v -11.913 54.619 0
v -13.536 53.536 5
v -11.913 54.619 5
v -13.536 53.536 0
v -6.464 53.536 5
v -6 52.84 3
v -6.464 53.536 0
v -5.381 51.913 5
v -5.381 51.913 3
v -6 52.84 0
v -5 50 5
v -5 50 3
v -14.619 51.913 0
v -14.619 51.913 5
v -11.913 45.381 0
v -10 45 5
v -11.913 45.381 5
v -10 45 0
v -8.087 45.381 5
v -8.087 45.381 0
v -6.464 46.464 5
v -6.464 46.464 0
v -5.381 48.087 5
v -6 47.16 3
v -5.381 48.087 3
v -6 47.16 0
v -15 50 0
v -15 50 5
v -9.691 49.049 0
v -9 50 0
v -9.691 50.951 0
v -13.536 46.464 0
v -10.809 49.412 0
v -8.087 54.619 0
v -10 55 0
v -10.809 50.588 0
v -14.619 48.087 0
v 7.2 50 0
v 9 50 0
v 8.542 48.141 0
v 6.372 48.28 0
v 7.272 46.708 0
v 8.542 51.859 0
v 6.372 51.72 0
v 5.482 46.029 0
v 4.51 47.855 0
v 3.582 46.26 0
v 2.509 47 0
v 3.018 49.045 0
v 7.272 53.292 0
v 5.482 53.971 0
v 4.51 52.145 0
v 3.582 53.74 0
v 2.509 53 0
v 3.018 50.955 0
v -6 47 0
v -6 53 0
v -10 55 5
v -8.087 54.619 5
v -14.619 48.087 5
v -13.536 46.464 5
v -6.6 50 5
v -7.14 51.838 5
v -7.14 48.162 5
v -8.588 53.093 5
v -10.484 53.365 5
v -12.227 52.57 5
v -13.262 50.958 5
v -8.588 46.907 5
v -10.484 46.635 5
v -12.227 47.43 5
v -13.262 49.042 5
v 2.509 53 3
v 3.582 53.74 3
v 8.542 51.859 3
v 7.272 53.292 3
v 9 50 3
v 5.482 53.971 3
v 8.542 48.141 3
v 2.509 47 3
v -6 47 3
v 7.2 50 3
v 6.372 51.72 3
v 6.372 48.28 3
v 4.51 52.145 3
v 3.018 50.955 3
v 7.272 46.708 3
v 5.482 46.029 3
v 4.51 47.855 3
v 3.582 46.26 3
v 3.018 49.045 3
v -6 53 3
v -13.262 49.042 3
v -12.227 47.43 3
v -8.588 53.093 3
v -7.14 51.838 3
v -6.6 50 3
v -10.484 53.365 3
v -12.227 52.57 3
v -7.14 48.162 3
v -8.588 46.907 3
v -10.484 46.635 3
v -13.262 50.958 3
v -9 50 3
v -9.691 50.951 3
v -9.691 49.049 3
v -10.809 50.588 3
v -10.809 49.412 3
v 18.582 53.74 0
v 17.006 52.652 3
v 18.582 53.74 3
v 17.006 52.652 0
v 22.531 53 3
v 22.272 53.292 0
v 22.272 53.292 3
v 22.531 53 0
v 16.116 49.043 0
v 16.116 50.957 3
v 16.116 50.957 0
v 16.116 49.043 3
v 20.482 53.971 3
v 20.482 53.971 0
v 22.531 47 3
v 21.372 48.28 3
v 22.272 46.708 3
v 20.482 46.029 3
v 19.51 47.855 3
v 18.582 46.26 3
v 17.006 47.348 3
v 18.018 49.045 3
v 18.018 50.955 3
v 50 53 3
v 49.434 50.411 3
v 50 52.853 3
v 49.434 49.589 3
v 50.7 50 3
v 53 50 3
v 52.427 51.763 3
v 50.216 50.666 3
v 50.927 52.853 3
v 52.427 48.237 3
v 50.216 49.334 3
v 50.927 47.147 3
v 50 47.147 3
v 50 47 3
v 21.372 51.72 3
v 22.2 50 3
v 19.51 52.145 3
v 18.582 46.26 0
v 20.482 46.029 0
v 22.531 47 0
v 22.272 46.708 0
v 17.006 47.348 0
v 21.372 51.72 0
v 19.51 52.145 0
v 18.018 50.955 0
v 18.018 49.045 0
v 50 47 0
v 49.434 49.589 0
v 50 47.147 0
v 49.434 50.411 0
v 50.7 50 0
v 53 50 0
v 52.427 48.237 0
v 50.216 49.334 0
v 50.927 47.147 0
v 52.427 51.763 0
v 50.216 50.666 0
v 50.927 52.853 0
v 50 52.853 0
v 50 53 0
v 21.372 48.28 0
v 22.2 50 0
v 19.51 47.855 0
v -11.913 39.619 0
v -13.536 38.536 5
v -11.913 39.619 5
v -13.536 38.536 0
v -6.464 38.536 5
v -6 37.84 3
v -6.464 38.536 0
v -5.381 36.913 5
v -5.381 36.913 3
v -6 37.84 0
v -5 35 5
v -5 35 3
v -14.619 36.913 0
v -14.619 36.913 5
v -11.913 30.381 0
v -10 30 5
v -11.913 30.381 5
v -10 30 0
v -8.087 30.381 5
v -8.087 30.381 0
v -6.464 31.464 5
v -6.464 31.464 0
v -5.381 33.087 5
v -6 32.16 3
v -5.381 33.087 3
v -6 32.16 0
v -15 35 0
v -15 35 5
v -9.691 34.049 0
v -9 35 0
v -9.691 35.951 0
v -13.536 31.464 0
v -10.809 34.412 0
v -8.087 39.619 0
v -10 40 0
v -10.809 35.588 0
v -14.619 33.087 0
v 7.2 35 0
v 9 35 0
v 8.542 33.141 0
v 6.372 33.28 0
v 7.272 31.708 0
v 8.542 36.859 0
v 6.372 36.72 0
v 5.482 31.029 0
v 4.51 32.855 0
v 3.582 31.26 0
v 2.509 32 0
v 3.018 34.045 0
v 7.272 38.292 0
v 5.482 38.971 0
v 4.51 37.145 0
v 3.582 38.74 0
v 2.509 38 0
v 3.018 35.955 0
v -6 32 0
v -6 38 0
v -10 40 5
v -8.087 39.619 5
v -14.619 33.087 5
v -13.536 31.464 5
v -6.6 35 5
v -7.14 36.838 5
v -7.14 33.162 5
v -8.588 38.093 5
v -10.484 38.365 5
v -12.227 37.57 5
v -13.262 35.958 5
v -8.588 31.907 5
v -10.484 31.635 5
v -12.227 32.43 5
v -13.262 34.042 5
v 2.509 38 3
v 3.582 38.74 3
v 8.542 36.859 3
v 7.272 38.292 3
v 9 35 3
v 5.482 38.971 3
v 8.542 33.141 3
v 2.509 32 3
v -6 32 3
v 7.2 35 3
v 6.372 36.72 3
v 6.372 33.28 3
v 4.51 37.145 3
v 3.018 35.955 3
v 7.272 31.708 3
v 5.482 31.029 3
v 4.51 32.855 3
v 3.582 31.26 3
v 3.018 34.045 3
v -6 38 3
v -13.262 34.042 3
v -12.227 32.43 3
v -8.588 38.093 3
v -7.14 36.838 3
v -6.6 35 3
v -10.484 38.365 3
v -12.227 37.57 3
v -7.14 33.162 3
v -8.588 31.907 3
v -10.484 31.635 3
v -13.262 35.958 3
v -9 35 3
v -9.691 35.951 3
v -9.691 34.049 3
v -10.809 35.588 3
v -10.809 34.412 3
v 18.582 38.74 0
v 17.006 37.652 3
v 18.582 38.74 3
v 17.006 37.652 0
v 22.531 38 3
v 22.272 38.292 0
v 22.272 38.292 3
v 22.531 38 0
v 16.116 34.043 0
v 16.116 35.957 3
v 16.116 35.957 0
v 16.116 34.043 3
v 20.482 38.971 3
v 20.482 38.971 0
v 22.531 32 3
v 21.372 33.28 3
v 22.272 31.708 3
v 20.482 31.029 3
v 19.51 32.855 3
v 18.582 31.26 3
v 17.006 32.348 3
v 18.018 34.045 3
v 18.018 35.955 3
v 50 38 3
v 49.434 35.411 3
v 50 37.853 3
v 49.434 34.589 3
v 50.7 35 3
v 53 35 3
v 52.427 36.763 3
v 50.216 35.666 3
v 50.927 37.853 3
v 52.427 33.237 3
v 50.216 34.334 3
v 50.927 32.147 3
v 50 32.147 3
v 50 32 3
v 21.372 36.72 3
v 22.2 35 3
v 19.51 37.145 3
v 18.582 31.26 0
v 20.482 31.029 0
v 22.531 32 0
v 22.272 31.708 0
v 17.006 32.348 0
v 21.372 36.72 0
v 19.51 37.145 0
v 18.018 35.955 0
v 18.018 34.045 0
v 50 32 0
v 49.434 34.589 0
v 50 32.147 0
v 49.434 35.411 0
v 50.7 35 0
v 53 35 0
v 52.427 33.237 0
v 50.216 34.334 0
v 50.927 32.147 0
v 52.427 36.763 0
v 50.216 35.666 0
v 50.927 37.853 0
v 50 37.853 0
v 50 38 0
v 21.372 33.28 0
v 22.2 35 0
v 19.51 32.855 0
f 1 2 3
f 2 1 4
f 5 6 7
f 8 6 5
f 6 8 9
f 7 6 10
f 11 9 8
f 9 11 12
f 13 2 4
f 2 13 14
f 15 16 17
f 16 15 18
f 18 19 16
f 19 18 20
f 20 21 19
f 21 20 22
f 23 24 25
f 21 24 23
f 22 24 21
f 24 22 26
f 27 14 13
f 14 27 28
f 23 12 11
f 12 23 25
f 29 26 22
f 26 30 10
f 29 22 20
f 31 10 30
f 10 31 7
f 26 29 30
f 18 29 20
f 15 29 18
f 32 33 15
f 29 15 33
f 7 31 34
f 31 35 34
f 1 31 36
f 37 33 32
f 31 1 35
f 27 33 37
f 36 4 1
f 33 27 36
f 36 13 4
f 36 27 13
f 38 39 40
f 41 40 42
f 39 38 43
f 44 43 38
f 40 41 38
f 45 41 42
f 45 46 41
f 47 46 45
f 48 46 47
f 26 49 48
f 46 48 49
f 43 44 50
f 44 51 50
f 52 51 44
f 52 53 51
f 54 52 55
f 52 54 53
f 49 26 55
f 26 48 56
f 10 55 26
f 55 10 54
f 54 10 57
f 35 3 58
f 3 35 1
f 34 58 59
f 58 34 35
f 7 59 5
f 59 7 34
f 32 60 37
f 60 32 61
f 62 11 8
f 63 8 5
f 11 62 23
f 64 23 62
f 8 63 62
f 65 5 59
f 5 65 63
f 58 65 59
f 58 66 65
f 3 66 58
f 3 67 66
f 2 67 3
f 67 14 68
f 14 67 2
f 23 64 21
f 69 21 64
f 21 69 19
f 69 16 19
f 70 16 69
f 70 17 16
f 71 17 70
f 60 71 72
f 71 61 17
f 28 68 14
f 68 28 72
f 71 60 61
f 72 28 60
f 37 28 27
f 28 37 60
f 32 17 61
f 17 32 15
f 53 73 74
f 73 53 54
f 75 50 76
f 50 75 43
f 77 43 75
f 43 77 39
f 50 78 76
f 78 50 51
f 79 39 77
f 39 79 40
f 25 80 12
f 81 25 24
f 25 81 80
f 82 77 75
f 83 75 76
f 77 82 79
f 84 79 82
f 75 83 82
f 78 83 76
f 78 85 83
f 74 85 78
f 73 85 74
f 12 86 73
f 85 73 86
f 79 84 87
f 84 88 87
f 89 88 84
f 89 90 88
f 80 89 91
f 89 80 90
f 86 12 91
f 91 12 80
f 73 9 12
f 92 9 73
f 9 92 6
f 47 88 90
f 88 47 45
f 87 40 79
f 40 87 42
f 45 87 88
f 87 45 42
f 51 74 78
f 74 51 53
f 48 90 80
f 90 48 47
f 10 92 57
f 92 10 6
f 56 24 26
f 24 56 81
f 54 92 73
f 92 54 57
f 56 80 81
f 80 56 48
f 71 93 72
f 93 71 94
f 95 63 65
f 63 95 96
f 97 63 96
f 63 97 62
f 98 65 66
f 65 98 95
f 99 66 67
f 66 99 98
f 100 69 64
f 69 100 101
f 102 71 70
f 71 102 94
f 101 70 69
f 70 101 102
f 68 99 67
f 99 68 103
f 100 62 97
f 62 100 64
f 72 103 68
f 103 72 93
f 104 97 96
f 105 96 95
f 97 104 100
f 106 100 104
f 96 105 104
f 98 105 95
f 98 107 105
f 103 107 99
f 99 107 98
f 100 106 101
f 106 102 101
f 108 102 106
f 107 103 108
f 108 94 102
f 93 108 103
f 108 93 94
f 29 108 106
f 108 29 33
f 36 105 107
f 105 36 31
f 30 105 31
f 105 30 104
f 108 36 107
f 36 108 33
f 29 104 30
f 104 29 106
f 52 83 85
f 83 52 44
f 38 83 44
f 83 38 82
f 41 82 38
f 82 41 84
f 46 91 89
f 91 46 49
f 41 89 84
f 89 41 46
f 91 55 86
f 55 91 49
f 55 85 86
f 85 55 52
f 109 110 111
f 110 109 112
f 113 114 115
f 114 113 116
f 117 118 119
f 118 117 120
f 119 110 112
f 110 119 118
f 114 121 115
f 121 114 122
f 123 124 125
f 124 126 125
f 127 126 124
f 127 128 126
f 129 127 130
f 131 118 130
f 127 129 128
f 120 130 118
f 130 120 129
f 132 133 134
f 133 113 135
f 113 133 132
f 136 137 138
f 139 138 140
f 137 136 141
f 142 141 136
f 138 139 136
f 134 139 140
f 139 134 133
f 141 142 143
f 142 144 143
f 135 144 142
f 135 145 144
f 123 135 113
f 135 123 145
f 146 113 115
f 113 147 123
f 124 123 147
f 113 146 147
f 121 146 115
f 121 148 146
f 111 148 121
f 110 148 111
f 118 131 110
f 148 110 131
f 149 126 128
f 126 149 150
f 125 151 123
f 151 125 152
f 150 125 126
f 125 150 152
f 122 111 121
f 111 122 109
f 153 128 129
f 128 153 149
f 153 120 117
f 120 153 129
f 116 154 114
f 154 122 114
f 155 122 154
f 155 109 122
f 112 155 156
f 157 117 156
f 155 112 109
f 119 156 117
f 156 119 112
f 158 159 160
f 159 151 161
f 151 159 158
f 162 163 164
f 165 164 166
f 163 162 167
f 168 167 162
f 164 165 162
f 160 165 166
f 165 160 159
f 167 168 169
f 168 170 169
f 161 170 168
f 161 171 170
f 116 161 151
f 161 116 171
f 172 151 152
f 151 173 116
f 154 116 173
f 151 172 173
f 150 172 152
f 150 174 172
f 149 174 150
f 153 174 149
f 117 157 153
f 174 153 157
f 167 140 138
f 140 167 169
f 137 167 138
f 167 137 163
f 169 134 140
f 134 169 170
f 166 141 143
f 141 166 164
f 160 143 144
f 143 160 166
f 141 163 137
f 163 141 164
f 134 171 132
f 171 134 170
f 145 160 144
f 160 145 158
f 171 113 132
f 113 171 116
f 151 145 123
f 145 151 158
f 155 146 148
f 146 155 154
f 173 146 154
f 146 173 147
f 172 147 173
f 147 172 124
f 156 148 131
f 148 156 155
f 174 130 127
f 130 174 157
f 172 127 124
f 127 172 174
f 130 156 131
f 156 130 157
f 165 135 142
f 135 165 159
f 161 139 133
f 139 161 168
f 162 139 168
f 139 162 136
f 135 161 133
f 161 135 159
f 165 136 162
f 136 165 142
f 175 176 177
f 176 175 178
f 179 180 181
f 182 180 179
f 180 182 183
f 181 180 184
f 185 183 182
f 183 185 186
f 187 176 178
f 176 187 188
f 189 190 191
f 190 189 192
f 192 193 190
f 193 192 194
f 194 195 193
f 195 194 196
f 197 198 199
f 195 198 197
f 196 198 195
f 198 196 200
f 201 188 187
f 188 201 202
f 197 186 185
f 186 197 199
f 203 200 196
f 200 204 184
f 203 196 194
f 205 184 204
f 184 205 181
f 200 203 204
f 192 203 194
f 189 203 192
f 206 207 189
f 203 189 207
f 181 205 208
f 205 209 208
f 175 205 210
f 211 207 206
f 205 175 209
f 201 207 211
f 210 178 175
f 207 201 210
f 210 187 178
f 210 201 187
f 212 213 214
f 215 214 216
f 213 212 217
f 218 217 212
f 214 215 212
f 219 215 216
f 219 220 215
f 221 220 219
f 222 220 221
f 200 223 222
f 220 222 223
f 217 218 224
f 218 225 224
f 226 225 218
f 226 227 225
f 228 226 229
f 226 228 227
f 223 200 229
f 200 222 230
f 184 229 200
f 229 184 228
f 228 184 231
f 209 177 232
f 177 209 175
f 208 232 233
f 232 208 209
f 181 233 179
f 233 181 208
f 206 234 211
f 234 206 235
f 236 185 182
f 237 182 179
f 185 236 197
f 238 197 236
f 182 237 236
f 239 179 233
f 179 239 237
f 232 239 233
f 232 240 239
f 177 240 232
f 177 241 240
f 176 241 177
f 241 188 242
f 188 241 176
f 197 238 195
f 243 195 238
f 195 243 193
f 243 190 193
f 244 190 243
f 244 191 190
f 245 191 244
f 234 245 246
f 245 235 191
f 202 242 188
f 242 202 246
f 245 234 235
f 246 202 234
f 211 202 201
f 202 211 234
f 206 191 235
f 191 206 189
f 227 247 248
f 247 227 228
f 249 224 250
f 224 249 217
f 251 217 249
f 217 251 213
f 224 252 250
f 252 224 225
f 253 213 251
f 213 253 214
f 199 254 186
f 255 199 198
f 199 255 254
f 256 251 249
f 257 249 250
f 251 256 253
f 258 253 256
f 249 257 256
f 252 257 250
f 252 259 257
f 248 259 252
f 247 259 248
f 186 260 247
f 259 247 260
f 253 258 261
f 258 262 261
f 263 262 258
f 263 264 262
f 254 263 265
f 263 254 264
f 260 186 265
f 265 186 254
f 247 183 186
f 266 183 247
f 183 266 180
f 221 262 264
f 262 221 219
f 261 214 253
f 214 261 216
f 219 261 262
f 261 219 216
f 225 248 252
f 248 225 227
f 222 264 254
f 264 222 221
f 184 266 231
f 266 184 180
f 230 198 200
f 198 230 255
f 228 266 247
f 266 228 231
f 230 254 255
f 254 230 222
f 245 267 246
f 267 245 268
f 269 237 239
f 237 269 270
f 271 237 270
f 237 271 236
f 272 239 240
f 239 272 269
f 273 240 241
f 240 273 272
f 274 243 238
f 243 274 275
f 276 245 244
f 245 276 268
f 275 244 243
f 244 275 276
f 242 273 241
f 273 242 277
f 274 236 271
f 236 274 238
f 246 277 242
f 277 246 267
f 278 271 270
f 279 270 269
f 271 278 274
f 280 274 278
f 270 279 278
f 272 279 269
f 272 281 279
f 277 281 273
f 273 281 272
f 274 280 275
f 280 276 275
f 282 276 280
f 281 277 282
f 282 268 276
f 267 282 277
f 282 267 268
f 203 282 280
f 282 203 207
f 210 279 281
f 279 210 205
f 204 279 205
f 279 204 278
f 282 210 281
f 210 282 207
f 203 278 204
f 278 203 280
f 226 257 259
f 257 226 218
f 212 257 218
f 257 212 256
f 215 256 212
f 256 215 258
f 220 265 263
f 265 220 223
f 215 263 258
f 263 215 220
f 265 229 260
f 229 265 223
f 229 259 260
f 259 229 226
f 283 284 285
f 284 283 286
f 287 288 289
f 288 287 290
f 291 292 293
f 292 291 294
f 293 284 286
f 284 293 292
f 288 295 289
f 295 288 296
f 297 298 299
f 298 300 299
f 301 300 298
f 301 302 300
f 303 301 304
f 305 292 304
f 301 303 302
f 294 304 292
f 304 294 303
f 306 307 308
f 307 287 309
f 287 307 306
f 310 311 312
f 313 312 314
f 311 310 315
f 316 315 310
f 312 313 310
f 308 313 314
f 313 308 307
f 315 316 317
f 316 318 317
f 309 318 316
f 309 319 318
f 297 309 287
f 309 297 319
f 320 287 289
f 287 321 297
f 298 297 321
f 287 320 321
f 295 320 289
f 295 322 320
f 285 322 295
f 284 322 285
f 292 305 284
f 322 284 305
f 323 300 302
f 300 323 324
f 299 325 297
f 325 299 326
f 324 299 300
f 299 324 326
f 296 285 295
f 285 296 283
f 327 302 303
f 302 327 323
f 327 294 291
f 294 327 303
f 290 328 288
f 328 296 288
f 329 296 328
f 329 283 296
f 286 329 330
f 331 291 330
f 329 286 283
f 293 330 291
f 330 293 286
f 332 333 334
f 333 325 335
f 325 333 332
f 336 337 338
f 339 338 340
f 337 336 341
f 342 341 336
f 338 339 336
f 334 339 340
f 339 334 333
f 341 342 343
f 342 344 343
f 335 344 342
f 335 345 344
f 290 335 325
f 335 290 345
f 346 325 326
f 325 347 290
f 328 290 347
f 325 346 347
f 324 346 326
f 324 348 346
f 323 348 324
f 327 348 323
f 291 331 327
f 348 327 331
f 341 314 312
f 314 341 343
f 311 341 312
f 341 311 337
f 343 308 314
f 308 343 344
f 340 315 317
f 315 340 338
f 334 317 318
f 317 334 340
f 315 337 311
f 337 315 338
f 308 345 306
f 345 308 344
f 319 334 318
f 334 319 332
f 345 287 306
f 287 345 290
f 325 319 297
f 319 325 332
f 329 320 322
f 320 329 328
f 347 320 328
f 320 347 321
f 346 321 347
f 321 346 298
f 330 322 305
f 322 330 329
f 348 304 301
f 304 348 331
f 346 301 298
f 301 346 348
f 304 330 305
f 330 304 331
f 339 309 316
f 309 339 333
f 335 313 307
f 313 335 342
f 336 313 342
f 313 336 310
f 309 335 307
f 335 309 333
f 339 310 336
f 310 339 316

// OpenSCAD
module qiShaftArm() {
    difference() {
        union() {
            cylinder(5, r=5);
            
            translate([15, 0, 0])
                cylinder(3, r=4);
            
            translate([4, -3, 0])
                cube([11, 6, 3]);
        }
        
        union() {
            translate([0, 0, 3])
                cylinder(5, r=3.4);
            
            translate([0, 0, -2])
                cylinder(7, r=1);
            
            translate([15, 0, -1])
                cylinder(5, r=2.2);
        }
    }
}

module qiShaftTransmission() {
    difference() {
        union() {
            cylinder(3, r=4);
            
            translate([30, 0, 0])
                cylinder(3, r=3);
            
            translate([0, -3, 0])
                cube([30, 6, 3]);
        }
        
        union() {            
            translate([0, 0, -2])
                cylinder(7, r=2.2);
            
            translate([30, 0, -1])
                cylinder(5, r=0.7);
        }
    }
}

module qiShafts() {
    qiShaftArm();

    for(i = [0 : 1]) {
        translate([0, i * -15, 0])
            qiShaftArm();
        
        translate([30, i * -15, 0])
            qiShaftTransmission();
    }
}


translate([-10, 50, 0])
    qiShafts();
